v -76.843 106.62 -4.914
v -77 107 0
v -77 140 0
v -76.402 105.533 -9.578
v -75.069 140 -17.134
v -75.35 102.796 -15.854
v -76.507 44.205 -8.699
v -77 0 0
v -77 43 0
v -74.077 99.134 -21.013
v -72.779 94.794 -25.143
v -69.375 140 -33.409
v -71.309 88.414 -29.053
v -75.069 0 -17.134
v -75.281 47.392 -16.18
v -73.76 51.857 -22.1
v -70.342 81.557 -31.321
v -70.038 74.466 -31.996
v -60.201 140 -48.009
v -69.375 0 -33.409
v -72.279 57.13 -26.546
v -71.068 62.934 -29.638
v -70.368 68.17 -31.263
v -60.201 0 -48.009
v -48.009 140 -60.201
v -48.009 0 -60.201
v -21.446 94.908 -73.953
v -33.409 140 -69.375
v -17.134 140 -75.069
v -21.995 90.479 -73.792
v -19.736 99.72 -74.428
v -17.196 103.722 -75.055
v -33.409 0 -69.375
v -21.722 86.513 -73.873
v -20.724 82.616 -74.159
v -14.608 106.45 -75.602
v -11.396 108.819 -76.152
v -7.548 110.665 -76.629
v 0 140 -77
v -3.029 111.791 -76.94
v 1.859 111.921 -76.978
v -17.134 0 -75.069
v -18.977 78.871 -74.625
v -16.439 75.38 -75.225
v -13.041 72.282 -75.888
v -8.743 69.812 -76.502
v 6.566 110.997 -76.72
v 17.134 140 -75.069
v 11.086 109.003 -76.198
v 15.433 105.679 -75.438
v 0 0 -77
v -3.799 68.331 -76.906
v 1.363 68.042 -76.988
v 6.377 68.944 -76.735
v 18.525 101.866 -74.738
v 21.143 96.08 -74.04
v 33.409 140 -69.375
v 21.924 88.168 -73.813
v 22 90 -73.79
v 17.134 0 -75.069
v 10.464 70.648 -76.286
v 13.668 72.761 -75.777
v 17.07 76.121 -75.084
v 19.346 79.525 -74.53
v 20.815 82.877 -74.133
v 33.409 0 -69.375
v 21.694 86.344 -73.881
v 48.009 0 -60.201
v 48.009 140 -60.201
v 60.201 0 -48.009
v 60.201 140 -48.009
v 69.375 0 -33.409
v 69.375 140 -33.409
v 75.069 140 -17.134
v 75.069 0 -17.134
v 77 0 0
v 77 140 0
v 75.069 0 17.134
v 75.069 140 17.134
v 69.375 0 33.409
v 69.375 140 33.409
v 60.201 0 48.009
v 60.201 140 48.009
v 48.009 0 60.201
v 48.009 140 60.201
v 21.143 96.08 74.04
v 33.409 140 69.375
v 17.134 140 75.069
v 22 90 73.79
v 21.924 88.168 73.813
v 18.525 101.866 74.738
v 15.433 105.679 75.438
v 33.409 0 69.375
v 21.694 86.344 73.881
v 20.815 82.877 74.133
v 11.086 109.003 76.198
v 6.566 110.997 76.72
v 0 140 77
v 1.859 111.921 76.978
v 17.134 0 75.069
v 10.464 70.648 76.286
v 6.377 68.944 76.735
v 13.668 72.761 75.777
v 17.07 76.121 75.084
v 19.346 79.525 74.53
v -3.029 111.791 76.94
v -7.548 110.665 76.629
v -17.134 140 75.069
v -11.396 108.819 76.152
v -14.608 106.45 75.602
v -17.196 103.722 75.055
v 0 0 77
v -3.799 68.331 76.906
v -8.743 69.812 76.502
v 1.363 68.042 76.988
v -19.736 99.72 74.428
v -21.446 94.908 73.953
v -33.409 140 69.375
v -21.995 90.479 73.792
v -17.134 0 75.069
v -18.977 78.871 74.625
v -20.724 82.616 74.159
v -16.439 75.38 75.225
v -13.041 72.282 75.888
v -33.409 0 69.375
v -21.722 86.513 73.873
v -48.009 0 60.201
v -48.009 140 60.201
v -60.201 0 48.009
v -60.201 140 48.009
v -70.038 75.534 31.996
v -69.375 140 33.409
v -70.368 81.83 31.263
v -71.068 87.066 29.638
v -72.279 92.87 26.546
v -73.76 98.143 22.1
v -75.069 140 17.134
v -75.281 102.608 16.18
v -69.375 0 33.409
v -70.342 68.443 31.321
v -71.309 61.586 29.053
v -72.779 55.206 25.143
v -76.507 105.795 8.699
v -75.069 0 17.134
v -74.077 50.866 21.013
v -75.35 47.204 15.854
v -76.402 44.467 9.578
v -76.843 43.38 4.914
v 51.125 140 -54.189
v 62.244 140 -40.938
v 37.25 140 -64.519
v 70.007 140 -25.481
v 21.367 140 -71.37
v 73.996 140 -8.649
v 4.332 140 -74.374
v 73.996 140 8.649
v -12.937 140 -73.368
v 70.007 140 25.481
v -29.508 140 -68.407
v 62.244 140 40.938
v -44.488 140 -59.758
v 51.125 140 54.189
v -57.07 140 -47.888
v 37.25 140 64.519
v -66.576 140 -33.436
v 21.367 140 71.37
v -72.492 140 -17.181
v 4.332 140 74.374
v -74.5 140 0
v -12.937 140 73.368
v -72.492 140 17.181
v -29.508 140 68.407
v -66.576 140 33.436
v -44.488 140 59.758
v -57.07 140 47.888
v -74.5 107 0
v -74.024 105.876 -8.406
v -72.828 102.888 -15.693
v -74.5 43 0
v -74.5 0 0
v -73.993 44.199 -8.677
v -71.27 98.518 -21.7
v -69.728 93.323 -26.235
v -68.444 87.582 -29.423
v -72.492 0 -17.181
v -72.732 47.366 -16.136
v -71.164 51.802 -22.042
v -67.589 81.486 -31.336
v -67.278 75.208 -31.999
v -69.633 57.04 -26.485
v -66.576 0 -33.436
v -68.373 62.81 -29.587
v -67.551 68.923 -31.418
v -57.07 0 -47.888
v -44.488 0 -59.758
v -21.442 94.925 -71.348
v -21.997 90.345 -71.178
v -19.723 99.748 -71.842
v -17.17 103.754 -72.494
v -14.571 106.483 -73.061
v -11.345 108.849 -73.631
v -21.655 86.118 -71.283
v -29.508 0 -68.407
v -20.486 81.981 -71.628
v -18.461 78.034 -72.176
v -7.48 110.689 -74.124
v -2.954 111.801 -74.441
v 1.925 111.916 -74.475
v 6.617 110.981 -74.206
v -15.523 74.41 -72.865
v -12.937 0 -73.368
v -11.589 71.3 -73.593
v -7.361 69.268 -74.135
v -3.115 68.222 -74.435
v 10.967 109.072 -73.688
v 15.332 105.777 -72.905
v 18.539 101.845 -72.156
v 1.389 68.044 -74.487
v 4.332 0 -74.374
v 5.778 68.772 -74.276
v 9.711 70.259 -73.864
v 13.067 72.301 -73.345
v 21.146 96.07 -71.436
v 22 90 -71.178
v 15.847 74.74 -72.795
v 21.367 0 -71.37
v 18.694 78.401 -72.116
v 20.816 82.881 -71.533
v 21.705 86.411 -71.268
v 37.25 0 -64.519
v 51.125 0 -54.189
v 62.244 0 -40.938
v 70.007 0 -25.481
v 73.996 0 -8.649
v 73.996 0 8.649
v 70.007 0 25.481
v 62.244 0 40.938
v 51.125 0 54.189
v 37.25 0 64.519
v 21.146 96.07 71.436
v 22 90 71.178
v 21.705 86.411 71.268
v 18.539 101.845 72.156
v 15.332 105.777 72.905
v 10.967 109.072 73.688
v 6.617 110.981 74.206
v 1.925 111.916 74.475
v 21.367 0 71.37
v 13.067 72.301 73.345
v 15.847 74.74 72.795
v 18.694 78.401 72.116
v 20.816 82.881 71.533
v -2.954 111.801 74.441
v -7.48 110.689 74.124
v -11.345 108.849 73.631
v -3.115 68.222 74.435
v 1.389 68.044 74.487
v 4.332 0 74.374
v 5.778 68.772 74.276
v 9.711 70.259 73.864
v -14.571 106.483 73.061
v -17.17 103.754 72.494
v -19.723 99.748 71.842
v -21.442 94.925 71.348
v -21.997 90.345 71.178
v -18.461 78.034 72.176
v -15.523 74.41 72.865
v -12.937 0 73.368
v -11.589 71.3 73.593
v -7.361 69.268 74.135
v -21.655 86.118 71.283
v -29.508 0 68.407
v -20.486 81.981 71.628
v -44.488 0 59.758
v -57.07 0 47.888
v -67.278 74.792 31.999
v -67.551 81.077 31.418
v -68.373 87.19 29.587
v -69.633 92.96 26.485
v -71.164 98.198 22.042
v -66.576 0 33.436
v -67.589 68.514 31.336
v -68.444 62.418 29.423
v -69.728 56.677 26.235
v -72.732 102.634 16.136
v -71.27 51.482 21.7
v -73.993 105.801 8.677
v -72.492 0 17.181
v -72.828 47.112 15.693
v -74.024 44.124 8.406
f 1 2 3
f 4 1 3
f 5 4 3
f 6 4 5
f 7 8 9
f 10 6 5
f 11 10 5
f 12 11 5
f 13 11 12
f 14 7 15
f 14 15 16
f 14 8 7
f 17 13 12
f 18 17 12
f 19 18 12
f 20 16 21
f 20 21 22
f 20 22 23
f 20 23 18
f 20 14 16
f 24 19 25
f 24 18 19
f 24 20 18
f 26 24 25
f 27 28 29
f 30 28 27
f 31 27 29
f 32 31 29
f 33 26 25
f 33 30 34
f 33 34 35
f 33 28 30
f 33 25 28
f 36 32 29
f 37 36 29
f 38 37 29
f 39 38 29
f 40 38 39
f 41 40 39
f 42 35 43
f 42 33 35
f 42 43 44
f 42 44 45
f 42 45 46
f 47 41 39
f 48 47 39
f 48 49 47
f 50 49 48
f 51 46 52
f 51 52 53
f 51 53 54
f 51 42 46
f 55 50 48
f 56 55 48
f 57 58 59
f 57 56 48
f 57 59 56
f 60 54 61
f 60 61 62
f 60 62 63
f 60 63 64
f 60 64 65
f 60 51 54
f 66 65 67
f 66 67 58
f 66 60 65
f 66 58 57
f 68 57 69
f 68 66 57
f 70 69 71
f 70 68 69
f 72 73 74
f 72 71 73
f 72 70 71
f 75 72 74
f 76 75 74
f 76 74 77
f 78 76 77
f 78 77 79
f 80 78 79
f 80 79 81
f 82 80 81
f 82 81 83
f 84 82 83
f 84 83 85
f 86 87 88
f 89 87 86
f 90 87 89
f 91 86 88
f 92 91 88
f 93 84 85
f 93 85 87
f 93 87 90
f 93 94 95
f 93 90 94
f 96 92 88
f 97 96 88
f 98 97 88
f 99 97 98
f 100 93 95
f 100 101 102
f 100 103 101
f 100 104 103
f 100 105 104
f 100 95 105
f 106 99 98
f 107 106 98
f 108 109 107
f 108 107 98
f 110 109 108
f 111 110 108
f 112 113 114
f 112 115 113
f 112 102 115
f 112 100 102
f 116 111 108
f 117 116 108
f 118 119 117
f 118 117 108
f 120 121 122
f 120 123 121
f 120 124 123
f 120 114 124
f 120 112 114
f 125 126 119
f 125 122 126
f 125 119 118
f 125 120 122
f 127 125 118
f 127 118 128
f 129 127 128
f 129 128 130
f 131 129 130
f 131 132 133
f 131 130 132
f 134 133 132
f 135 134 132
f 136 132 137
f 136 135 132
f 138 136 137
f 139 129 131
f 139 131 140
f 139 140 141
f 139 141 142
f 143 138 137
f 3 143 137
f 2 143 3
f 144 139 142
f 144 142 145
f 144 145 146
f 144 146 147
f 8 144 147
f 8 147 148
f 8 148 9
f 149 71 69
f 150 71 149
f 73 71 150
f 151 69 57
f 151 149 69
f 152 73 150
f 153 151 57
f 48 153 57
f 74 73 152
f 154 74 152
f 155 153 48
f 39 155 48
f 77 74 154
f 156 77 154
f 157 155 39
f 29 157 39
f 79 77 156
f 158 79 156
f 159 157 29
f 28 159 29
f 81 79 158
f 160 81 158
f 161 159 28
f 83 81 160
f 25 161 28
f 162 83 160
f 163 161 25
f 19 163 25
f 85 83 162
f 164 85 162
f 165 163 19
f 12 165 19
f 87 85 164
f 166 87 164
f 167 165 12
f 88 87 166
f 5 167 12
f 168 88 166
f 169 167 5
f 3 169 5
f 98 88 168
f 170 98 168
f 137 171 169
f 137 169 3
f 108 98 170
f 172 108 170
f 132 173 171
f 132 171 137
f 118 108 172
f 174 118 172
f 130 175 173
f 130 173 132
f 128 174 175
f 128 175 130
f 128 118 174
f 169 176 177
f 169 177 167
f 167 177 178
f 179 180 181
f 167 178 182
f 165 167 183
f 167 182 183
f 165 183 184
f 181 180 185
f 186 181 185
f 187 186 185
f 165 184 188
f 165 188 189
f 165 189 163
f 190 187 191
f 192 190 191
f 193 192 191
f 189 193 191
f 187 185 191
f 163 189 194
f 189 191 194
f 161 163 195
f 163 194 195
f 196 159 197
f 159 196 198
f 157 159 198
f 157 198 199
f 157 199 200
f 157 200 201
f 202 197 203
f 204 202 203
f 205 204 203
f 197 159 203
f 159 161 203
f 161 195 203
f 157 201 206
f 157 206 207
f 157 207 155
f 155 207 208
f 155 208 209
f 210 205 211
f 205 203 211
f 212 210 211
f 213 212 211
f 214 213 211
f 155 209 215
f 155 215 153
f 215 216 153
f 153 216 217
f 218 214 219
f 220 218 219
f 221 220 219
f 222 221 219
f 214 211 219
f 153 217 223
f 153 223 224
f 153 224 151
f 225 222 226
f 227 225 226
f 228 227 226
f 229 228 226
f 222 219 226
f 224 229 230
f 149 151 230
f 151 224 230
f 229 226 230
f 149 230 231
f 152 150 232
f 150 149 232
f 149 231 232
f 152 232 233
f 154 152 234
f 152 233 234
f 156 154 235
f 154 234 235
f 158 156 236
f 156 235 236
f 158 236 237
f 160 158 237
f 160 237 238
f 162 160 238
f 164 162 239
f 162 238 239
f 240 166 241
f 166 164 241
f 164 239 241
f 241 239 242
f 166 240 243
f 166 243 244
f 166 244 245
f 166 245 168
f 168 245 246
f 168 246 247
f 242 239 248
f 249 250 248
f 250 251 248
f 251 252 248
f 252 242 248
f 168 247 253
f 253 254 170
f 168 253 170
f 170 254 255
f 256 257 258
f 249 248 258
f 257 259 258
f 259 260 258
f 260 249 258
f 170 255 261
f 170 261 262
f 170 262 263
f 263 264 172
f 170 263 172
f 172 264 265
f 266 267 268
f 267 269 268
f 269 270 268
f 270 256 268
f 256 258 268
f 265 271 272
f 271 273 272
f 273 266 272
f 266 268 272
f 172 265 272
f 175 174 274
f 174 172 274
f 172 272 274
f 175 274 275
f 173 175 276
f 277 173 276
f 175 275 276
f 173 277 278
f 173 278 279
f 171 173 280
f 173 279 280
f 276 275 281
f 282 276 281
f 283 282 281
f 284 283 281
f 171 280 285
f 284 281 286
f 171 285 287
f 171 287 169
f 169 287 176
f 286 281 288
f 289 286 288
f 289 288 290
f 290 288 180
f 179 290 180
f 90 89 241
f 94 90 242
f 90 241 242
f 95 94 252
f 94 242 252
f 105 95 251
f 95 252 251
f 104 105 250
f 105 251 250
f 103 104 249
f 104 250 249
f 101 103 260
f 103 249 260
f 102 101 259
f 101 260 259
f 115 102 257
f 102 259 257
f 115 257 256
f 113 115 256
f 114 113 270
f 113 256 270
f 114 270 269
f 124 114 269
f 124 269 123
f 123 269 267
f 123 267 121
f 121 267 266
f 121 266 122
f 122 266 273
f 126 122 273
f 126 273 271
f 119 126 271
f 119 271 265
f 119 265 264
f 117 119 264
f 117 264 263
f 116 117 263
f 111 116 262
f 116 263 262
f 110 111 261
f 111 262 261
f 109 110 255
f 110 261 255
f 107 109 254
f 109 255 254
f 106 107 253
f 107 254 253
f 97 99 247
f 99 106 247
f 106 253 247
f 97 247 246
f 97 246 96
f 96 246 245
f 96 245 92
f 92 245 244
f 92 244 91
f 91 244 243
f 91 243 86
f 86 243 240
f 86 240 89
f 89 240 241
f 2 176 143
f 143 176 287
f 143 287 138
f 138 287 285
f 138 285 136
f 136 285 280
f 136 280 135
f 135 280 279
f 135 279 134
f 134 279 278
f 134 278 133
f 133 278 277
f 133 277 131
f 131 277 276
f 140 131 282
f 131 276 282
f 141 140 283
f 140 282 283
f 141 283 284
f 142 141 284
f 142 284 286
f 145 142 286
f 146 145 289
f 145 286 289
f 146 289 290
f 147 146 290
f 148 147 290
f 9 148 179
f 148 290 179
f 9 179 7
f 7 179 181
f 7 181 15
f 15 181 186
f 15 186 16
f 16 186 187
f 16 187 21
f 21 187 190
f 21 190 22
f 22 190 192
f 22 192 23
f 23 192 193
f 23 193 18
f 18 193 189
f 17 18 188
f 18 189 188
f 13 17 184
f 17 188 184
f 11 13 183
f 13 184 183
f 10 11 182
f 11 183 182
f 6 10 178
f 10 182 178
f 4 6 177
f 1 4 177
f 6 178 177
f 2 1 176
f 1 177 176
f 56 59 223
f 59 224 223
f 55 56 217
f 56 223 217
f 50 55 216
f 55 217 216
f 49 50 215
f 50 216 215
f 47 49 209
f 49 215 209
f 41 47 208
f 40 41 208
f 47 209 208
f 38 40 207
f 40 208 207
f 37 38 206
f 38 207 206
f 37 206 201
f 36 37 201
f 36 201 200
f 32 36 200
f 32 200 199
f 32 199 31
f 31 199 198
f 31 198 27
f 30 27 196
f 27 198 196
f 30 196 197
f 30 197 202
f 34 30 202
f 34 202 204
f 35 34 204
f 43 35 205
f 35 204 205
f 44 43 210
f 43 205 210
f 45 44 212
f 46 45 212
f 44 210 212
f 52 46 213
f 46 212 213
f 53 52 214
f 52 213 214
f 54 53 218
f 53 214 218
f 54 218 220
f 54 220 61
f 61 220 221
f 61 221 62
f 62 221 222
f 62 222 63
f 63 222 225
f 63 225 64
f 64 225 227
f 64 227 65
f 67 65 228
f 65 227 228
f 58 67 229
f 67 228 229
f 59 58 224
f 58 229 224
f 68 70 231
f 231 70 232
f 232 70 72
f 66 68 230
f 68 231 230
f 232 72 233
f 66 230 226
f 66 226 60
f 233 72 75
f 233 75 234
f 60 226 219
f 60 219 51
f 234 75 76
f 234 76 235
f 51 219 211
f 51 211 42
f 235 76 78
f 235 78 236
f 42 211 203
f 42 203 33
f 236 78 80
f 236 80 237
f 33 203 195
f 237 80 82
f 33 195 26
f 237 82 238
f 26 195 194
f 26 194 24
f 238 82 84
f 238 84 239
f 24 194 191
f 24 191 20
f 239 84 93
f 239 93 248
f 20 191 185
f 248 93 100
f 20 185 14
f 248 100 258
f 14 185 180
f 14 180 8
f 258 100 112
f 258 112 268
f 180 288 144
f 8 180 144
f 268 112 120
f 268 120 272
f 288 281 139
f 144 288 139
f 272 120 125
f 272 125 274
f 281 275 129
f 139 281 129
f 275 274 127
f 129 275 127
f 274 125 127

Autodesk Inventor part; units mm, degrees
ref_plane "YZ Plane" through (0, 0, 0) normal (1, 0, 0) x (0, 1, 0)
ref_plane "XZ Plane" through (0, 0, 0) normal (0, 1, 0) x (-1, 0, 0)
ref_plane "XY Plane" through (0, 0, 0) normal (0, 0, 1) x (1, 0, 0)
sketch "Sketch1" plane through (0, 0, 0) normal (0, 1, 0) x (-1, 0, 0)
  circle A0 centre (0, 0) radius 77
  circle A1 centre (0, 0) radius 74.5
  dimension "d0" = 154
  dimension "d1" = 149
extrude "Extrusion1" add sketch "Sketch1" along normal blind 140
sketch "Sketch2" plane through (0, 0, 0) normal (1, 0, 0) x (0, 1, 0)
  circle A0 centre (75, 0) radius 32
  line L0 (0, -77) -> (0, 77) projected
  point P0 (0, 0)
  dimension "d4" = 64
  dimension "d5" = 75
extrude "Extrusion2" cut sketch "Sketch2" against normal through all
sketch "Sketch3" plane through (0, 0, 0) normal (0, 0, 1) x (1, 0, 0)
  circle A0 centre (0, 90) radius 22
  line L0 (77, 0) -> (-77, 0) projected
  point P0 (0, 0)
  dimension "d8" = 44
  dimension "d9" = 90
extrude "Extrusion3" cut sketch "Sketch3" along normal through all both and the other way through all
equation "\"d5\" = h_w"
equation "\"h_w\" = 75"
properties part number "chamber"
